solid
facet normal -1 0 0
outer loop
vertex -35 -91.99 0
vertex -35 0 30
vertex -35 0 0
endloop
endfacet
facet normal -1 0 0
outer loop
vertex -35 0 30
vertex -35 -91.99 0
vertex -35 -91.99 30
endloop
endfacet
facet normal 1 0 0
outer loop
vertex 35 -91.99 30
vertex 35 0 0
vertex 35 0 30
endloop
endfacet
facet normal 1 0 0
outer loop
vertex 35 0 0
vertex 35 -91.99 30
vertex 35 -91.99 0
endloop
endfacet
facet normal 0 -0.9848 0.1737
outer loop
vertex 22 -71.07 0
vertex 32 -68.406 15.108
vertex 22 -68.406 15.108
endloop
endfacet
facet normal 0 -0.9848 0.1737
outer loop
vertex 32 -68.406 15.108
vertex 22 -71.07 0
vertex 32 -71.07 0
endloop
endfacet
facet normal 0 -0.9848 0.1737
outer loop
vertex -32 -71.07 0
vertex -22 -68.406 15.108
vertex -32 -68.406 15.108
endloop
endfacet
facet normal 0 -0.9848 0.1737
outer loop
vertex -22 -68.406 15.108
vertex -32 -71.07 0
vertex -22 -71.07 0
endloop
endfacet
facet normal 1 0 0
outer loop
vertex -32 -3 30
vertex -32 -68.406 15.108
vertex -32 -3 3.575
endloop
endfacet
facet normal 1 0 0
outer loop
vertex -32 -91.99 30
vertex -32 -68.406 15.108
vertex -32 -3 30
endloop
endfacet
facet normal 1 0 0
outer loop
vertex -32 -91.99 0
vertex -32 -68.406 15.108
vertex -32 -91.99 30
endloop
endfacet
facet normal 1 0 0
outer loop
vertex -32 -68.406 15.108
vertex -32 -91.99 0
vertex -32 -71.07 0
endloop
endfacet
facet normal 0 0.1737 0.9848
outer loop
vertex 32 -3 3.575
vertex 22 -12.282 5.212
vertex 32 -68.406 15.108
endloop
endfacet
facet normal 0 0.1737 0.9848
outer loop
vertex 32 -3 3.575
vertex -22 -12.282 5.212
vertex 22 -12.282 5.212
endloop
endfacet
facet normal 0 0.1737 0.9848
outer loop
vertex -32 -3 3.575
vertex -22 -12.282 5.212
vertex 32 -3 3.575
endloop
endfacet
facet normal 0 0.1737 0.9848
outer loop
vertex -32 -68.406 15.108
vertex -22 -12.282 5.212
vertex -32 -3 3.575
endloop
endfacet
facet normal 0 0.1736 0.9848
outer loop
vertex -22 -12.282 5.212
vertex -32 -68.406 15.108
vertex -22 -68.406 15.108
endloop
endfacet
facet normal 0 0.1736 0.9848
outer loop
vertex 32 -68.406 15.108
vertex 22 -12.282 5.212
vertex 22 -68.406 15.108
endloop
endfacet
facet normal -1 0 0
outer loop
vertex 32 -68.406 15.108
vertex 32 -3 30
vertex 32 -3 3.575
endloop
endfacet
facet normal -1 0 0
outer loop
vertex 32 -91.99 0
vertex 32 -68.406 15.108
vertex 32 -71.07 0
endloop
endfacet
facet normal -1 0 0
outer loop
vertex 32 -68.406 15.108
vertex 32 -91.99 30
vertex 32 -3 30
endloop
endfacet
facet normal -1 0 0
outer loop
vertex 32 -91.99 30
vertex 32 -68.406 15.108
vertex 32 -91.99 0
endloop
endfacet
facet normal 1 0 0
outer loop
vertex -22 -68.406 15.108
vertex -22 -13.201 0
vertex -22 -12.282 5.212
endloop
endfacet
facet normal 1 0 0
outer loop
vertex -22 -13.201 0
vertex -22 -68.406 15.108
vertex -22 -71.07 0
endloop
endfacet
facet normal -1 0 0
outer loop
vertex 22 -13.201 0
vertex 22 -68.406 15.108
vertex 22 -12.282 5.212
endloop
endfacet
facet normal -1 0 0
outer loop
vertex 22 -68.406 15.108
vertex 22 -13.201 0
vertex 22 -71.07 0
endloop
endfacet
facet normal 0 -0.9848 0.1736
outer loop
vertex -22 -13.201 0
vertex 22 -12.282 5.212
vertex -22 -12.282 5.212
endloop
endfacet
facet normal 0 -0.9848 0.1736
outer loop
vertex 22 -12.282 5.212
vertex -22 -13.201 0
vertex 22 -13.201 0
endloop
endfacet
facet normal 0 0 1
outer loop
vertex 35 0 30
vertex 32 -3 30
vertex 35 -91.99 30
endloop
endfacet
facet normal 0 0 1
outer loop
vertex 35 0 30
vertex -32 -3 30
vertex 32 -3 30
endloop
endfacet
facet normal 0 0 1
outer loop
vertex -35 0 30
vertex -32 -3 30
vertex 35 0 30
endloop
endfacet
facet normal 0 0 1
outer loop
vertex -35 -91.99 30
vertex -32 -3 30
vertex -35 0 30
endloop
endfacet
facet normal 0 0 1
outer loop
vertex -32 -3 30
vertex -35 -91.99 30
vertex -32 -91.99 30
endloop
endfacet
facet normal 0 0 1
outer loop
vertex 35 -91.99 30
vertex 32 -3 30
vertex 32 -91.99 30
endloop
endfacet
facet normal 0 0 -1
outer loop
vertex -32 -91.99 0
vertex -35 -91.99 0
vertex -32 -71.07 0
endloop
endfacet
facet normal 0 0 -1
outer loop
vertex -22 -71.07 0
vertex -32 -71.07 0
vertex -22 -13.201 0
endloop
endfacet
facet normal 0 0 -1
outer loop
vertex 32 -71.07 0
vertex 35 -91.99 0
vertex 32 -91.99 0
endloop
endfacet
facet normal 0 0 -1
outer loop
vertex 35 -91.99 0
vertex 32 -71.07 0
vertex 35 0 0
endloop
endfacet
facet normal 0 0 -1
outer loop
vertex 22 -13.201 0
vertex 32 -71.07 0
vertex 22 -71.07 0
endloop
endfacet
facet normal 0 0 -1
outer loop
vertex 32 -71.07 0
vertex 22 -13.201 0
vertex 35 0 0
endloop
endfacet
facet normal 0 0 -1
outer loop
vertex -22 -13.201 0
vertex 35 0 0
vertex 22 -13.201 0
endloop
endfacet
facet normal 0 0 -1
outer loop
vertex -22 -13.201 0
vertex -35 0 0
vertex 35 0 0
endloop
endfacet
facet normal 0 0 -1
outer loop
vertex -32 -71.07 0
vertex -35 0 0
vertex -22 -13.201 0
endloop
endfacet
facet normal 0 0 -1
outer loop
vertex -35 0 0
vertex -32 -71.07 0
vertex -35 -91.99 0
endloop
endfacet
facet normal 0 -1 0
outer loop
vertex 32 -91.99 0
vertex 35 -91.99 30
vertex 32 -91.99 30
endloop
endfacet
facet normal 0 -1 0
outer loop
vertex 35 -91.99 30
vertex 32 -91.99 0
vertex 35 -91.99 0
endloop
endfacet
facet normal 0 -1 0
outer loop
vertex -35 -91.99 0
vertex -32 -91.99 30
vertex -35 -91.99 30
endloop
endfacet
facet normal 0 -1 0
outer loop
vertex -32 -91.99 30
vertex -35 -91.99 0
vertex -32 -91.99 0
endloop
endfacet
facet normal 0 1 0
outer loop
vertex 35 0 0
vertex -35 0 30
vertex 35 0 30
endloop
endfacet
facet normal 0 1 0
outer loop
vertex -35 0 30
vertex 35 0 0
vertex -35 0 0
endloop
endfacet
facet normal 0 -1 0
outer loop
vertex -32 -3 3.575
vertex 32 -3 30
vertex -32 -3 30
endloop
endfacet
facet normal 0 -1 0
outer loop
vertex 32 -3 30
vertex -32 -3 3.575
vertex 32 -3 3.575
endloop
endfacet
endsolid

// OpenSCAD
/*

  ccm_tray.scad
  
  (c) olikraus@gmail.com

  This work is licensed under the Creative Commons Attribution-NonCommercial-ShareAlike 4.0 International License.
  To view a copy of this license, visit http://creativecommons.org/licenses/by-nc-sa/4.0/.

*/

include <card_compare_machine.scad>;

rotate([0,0,180])
tray();
